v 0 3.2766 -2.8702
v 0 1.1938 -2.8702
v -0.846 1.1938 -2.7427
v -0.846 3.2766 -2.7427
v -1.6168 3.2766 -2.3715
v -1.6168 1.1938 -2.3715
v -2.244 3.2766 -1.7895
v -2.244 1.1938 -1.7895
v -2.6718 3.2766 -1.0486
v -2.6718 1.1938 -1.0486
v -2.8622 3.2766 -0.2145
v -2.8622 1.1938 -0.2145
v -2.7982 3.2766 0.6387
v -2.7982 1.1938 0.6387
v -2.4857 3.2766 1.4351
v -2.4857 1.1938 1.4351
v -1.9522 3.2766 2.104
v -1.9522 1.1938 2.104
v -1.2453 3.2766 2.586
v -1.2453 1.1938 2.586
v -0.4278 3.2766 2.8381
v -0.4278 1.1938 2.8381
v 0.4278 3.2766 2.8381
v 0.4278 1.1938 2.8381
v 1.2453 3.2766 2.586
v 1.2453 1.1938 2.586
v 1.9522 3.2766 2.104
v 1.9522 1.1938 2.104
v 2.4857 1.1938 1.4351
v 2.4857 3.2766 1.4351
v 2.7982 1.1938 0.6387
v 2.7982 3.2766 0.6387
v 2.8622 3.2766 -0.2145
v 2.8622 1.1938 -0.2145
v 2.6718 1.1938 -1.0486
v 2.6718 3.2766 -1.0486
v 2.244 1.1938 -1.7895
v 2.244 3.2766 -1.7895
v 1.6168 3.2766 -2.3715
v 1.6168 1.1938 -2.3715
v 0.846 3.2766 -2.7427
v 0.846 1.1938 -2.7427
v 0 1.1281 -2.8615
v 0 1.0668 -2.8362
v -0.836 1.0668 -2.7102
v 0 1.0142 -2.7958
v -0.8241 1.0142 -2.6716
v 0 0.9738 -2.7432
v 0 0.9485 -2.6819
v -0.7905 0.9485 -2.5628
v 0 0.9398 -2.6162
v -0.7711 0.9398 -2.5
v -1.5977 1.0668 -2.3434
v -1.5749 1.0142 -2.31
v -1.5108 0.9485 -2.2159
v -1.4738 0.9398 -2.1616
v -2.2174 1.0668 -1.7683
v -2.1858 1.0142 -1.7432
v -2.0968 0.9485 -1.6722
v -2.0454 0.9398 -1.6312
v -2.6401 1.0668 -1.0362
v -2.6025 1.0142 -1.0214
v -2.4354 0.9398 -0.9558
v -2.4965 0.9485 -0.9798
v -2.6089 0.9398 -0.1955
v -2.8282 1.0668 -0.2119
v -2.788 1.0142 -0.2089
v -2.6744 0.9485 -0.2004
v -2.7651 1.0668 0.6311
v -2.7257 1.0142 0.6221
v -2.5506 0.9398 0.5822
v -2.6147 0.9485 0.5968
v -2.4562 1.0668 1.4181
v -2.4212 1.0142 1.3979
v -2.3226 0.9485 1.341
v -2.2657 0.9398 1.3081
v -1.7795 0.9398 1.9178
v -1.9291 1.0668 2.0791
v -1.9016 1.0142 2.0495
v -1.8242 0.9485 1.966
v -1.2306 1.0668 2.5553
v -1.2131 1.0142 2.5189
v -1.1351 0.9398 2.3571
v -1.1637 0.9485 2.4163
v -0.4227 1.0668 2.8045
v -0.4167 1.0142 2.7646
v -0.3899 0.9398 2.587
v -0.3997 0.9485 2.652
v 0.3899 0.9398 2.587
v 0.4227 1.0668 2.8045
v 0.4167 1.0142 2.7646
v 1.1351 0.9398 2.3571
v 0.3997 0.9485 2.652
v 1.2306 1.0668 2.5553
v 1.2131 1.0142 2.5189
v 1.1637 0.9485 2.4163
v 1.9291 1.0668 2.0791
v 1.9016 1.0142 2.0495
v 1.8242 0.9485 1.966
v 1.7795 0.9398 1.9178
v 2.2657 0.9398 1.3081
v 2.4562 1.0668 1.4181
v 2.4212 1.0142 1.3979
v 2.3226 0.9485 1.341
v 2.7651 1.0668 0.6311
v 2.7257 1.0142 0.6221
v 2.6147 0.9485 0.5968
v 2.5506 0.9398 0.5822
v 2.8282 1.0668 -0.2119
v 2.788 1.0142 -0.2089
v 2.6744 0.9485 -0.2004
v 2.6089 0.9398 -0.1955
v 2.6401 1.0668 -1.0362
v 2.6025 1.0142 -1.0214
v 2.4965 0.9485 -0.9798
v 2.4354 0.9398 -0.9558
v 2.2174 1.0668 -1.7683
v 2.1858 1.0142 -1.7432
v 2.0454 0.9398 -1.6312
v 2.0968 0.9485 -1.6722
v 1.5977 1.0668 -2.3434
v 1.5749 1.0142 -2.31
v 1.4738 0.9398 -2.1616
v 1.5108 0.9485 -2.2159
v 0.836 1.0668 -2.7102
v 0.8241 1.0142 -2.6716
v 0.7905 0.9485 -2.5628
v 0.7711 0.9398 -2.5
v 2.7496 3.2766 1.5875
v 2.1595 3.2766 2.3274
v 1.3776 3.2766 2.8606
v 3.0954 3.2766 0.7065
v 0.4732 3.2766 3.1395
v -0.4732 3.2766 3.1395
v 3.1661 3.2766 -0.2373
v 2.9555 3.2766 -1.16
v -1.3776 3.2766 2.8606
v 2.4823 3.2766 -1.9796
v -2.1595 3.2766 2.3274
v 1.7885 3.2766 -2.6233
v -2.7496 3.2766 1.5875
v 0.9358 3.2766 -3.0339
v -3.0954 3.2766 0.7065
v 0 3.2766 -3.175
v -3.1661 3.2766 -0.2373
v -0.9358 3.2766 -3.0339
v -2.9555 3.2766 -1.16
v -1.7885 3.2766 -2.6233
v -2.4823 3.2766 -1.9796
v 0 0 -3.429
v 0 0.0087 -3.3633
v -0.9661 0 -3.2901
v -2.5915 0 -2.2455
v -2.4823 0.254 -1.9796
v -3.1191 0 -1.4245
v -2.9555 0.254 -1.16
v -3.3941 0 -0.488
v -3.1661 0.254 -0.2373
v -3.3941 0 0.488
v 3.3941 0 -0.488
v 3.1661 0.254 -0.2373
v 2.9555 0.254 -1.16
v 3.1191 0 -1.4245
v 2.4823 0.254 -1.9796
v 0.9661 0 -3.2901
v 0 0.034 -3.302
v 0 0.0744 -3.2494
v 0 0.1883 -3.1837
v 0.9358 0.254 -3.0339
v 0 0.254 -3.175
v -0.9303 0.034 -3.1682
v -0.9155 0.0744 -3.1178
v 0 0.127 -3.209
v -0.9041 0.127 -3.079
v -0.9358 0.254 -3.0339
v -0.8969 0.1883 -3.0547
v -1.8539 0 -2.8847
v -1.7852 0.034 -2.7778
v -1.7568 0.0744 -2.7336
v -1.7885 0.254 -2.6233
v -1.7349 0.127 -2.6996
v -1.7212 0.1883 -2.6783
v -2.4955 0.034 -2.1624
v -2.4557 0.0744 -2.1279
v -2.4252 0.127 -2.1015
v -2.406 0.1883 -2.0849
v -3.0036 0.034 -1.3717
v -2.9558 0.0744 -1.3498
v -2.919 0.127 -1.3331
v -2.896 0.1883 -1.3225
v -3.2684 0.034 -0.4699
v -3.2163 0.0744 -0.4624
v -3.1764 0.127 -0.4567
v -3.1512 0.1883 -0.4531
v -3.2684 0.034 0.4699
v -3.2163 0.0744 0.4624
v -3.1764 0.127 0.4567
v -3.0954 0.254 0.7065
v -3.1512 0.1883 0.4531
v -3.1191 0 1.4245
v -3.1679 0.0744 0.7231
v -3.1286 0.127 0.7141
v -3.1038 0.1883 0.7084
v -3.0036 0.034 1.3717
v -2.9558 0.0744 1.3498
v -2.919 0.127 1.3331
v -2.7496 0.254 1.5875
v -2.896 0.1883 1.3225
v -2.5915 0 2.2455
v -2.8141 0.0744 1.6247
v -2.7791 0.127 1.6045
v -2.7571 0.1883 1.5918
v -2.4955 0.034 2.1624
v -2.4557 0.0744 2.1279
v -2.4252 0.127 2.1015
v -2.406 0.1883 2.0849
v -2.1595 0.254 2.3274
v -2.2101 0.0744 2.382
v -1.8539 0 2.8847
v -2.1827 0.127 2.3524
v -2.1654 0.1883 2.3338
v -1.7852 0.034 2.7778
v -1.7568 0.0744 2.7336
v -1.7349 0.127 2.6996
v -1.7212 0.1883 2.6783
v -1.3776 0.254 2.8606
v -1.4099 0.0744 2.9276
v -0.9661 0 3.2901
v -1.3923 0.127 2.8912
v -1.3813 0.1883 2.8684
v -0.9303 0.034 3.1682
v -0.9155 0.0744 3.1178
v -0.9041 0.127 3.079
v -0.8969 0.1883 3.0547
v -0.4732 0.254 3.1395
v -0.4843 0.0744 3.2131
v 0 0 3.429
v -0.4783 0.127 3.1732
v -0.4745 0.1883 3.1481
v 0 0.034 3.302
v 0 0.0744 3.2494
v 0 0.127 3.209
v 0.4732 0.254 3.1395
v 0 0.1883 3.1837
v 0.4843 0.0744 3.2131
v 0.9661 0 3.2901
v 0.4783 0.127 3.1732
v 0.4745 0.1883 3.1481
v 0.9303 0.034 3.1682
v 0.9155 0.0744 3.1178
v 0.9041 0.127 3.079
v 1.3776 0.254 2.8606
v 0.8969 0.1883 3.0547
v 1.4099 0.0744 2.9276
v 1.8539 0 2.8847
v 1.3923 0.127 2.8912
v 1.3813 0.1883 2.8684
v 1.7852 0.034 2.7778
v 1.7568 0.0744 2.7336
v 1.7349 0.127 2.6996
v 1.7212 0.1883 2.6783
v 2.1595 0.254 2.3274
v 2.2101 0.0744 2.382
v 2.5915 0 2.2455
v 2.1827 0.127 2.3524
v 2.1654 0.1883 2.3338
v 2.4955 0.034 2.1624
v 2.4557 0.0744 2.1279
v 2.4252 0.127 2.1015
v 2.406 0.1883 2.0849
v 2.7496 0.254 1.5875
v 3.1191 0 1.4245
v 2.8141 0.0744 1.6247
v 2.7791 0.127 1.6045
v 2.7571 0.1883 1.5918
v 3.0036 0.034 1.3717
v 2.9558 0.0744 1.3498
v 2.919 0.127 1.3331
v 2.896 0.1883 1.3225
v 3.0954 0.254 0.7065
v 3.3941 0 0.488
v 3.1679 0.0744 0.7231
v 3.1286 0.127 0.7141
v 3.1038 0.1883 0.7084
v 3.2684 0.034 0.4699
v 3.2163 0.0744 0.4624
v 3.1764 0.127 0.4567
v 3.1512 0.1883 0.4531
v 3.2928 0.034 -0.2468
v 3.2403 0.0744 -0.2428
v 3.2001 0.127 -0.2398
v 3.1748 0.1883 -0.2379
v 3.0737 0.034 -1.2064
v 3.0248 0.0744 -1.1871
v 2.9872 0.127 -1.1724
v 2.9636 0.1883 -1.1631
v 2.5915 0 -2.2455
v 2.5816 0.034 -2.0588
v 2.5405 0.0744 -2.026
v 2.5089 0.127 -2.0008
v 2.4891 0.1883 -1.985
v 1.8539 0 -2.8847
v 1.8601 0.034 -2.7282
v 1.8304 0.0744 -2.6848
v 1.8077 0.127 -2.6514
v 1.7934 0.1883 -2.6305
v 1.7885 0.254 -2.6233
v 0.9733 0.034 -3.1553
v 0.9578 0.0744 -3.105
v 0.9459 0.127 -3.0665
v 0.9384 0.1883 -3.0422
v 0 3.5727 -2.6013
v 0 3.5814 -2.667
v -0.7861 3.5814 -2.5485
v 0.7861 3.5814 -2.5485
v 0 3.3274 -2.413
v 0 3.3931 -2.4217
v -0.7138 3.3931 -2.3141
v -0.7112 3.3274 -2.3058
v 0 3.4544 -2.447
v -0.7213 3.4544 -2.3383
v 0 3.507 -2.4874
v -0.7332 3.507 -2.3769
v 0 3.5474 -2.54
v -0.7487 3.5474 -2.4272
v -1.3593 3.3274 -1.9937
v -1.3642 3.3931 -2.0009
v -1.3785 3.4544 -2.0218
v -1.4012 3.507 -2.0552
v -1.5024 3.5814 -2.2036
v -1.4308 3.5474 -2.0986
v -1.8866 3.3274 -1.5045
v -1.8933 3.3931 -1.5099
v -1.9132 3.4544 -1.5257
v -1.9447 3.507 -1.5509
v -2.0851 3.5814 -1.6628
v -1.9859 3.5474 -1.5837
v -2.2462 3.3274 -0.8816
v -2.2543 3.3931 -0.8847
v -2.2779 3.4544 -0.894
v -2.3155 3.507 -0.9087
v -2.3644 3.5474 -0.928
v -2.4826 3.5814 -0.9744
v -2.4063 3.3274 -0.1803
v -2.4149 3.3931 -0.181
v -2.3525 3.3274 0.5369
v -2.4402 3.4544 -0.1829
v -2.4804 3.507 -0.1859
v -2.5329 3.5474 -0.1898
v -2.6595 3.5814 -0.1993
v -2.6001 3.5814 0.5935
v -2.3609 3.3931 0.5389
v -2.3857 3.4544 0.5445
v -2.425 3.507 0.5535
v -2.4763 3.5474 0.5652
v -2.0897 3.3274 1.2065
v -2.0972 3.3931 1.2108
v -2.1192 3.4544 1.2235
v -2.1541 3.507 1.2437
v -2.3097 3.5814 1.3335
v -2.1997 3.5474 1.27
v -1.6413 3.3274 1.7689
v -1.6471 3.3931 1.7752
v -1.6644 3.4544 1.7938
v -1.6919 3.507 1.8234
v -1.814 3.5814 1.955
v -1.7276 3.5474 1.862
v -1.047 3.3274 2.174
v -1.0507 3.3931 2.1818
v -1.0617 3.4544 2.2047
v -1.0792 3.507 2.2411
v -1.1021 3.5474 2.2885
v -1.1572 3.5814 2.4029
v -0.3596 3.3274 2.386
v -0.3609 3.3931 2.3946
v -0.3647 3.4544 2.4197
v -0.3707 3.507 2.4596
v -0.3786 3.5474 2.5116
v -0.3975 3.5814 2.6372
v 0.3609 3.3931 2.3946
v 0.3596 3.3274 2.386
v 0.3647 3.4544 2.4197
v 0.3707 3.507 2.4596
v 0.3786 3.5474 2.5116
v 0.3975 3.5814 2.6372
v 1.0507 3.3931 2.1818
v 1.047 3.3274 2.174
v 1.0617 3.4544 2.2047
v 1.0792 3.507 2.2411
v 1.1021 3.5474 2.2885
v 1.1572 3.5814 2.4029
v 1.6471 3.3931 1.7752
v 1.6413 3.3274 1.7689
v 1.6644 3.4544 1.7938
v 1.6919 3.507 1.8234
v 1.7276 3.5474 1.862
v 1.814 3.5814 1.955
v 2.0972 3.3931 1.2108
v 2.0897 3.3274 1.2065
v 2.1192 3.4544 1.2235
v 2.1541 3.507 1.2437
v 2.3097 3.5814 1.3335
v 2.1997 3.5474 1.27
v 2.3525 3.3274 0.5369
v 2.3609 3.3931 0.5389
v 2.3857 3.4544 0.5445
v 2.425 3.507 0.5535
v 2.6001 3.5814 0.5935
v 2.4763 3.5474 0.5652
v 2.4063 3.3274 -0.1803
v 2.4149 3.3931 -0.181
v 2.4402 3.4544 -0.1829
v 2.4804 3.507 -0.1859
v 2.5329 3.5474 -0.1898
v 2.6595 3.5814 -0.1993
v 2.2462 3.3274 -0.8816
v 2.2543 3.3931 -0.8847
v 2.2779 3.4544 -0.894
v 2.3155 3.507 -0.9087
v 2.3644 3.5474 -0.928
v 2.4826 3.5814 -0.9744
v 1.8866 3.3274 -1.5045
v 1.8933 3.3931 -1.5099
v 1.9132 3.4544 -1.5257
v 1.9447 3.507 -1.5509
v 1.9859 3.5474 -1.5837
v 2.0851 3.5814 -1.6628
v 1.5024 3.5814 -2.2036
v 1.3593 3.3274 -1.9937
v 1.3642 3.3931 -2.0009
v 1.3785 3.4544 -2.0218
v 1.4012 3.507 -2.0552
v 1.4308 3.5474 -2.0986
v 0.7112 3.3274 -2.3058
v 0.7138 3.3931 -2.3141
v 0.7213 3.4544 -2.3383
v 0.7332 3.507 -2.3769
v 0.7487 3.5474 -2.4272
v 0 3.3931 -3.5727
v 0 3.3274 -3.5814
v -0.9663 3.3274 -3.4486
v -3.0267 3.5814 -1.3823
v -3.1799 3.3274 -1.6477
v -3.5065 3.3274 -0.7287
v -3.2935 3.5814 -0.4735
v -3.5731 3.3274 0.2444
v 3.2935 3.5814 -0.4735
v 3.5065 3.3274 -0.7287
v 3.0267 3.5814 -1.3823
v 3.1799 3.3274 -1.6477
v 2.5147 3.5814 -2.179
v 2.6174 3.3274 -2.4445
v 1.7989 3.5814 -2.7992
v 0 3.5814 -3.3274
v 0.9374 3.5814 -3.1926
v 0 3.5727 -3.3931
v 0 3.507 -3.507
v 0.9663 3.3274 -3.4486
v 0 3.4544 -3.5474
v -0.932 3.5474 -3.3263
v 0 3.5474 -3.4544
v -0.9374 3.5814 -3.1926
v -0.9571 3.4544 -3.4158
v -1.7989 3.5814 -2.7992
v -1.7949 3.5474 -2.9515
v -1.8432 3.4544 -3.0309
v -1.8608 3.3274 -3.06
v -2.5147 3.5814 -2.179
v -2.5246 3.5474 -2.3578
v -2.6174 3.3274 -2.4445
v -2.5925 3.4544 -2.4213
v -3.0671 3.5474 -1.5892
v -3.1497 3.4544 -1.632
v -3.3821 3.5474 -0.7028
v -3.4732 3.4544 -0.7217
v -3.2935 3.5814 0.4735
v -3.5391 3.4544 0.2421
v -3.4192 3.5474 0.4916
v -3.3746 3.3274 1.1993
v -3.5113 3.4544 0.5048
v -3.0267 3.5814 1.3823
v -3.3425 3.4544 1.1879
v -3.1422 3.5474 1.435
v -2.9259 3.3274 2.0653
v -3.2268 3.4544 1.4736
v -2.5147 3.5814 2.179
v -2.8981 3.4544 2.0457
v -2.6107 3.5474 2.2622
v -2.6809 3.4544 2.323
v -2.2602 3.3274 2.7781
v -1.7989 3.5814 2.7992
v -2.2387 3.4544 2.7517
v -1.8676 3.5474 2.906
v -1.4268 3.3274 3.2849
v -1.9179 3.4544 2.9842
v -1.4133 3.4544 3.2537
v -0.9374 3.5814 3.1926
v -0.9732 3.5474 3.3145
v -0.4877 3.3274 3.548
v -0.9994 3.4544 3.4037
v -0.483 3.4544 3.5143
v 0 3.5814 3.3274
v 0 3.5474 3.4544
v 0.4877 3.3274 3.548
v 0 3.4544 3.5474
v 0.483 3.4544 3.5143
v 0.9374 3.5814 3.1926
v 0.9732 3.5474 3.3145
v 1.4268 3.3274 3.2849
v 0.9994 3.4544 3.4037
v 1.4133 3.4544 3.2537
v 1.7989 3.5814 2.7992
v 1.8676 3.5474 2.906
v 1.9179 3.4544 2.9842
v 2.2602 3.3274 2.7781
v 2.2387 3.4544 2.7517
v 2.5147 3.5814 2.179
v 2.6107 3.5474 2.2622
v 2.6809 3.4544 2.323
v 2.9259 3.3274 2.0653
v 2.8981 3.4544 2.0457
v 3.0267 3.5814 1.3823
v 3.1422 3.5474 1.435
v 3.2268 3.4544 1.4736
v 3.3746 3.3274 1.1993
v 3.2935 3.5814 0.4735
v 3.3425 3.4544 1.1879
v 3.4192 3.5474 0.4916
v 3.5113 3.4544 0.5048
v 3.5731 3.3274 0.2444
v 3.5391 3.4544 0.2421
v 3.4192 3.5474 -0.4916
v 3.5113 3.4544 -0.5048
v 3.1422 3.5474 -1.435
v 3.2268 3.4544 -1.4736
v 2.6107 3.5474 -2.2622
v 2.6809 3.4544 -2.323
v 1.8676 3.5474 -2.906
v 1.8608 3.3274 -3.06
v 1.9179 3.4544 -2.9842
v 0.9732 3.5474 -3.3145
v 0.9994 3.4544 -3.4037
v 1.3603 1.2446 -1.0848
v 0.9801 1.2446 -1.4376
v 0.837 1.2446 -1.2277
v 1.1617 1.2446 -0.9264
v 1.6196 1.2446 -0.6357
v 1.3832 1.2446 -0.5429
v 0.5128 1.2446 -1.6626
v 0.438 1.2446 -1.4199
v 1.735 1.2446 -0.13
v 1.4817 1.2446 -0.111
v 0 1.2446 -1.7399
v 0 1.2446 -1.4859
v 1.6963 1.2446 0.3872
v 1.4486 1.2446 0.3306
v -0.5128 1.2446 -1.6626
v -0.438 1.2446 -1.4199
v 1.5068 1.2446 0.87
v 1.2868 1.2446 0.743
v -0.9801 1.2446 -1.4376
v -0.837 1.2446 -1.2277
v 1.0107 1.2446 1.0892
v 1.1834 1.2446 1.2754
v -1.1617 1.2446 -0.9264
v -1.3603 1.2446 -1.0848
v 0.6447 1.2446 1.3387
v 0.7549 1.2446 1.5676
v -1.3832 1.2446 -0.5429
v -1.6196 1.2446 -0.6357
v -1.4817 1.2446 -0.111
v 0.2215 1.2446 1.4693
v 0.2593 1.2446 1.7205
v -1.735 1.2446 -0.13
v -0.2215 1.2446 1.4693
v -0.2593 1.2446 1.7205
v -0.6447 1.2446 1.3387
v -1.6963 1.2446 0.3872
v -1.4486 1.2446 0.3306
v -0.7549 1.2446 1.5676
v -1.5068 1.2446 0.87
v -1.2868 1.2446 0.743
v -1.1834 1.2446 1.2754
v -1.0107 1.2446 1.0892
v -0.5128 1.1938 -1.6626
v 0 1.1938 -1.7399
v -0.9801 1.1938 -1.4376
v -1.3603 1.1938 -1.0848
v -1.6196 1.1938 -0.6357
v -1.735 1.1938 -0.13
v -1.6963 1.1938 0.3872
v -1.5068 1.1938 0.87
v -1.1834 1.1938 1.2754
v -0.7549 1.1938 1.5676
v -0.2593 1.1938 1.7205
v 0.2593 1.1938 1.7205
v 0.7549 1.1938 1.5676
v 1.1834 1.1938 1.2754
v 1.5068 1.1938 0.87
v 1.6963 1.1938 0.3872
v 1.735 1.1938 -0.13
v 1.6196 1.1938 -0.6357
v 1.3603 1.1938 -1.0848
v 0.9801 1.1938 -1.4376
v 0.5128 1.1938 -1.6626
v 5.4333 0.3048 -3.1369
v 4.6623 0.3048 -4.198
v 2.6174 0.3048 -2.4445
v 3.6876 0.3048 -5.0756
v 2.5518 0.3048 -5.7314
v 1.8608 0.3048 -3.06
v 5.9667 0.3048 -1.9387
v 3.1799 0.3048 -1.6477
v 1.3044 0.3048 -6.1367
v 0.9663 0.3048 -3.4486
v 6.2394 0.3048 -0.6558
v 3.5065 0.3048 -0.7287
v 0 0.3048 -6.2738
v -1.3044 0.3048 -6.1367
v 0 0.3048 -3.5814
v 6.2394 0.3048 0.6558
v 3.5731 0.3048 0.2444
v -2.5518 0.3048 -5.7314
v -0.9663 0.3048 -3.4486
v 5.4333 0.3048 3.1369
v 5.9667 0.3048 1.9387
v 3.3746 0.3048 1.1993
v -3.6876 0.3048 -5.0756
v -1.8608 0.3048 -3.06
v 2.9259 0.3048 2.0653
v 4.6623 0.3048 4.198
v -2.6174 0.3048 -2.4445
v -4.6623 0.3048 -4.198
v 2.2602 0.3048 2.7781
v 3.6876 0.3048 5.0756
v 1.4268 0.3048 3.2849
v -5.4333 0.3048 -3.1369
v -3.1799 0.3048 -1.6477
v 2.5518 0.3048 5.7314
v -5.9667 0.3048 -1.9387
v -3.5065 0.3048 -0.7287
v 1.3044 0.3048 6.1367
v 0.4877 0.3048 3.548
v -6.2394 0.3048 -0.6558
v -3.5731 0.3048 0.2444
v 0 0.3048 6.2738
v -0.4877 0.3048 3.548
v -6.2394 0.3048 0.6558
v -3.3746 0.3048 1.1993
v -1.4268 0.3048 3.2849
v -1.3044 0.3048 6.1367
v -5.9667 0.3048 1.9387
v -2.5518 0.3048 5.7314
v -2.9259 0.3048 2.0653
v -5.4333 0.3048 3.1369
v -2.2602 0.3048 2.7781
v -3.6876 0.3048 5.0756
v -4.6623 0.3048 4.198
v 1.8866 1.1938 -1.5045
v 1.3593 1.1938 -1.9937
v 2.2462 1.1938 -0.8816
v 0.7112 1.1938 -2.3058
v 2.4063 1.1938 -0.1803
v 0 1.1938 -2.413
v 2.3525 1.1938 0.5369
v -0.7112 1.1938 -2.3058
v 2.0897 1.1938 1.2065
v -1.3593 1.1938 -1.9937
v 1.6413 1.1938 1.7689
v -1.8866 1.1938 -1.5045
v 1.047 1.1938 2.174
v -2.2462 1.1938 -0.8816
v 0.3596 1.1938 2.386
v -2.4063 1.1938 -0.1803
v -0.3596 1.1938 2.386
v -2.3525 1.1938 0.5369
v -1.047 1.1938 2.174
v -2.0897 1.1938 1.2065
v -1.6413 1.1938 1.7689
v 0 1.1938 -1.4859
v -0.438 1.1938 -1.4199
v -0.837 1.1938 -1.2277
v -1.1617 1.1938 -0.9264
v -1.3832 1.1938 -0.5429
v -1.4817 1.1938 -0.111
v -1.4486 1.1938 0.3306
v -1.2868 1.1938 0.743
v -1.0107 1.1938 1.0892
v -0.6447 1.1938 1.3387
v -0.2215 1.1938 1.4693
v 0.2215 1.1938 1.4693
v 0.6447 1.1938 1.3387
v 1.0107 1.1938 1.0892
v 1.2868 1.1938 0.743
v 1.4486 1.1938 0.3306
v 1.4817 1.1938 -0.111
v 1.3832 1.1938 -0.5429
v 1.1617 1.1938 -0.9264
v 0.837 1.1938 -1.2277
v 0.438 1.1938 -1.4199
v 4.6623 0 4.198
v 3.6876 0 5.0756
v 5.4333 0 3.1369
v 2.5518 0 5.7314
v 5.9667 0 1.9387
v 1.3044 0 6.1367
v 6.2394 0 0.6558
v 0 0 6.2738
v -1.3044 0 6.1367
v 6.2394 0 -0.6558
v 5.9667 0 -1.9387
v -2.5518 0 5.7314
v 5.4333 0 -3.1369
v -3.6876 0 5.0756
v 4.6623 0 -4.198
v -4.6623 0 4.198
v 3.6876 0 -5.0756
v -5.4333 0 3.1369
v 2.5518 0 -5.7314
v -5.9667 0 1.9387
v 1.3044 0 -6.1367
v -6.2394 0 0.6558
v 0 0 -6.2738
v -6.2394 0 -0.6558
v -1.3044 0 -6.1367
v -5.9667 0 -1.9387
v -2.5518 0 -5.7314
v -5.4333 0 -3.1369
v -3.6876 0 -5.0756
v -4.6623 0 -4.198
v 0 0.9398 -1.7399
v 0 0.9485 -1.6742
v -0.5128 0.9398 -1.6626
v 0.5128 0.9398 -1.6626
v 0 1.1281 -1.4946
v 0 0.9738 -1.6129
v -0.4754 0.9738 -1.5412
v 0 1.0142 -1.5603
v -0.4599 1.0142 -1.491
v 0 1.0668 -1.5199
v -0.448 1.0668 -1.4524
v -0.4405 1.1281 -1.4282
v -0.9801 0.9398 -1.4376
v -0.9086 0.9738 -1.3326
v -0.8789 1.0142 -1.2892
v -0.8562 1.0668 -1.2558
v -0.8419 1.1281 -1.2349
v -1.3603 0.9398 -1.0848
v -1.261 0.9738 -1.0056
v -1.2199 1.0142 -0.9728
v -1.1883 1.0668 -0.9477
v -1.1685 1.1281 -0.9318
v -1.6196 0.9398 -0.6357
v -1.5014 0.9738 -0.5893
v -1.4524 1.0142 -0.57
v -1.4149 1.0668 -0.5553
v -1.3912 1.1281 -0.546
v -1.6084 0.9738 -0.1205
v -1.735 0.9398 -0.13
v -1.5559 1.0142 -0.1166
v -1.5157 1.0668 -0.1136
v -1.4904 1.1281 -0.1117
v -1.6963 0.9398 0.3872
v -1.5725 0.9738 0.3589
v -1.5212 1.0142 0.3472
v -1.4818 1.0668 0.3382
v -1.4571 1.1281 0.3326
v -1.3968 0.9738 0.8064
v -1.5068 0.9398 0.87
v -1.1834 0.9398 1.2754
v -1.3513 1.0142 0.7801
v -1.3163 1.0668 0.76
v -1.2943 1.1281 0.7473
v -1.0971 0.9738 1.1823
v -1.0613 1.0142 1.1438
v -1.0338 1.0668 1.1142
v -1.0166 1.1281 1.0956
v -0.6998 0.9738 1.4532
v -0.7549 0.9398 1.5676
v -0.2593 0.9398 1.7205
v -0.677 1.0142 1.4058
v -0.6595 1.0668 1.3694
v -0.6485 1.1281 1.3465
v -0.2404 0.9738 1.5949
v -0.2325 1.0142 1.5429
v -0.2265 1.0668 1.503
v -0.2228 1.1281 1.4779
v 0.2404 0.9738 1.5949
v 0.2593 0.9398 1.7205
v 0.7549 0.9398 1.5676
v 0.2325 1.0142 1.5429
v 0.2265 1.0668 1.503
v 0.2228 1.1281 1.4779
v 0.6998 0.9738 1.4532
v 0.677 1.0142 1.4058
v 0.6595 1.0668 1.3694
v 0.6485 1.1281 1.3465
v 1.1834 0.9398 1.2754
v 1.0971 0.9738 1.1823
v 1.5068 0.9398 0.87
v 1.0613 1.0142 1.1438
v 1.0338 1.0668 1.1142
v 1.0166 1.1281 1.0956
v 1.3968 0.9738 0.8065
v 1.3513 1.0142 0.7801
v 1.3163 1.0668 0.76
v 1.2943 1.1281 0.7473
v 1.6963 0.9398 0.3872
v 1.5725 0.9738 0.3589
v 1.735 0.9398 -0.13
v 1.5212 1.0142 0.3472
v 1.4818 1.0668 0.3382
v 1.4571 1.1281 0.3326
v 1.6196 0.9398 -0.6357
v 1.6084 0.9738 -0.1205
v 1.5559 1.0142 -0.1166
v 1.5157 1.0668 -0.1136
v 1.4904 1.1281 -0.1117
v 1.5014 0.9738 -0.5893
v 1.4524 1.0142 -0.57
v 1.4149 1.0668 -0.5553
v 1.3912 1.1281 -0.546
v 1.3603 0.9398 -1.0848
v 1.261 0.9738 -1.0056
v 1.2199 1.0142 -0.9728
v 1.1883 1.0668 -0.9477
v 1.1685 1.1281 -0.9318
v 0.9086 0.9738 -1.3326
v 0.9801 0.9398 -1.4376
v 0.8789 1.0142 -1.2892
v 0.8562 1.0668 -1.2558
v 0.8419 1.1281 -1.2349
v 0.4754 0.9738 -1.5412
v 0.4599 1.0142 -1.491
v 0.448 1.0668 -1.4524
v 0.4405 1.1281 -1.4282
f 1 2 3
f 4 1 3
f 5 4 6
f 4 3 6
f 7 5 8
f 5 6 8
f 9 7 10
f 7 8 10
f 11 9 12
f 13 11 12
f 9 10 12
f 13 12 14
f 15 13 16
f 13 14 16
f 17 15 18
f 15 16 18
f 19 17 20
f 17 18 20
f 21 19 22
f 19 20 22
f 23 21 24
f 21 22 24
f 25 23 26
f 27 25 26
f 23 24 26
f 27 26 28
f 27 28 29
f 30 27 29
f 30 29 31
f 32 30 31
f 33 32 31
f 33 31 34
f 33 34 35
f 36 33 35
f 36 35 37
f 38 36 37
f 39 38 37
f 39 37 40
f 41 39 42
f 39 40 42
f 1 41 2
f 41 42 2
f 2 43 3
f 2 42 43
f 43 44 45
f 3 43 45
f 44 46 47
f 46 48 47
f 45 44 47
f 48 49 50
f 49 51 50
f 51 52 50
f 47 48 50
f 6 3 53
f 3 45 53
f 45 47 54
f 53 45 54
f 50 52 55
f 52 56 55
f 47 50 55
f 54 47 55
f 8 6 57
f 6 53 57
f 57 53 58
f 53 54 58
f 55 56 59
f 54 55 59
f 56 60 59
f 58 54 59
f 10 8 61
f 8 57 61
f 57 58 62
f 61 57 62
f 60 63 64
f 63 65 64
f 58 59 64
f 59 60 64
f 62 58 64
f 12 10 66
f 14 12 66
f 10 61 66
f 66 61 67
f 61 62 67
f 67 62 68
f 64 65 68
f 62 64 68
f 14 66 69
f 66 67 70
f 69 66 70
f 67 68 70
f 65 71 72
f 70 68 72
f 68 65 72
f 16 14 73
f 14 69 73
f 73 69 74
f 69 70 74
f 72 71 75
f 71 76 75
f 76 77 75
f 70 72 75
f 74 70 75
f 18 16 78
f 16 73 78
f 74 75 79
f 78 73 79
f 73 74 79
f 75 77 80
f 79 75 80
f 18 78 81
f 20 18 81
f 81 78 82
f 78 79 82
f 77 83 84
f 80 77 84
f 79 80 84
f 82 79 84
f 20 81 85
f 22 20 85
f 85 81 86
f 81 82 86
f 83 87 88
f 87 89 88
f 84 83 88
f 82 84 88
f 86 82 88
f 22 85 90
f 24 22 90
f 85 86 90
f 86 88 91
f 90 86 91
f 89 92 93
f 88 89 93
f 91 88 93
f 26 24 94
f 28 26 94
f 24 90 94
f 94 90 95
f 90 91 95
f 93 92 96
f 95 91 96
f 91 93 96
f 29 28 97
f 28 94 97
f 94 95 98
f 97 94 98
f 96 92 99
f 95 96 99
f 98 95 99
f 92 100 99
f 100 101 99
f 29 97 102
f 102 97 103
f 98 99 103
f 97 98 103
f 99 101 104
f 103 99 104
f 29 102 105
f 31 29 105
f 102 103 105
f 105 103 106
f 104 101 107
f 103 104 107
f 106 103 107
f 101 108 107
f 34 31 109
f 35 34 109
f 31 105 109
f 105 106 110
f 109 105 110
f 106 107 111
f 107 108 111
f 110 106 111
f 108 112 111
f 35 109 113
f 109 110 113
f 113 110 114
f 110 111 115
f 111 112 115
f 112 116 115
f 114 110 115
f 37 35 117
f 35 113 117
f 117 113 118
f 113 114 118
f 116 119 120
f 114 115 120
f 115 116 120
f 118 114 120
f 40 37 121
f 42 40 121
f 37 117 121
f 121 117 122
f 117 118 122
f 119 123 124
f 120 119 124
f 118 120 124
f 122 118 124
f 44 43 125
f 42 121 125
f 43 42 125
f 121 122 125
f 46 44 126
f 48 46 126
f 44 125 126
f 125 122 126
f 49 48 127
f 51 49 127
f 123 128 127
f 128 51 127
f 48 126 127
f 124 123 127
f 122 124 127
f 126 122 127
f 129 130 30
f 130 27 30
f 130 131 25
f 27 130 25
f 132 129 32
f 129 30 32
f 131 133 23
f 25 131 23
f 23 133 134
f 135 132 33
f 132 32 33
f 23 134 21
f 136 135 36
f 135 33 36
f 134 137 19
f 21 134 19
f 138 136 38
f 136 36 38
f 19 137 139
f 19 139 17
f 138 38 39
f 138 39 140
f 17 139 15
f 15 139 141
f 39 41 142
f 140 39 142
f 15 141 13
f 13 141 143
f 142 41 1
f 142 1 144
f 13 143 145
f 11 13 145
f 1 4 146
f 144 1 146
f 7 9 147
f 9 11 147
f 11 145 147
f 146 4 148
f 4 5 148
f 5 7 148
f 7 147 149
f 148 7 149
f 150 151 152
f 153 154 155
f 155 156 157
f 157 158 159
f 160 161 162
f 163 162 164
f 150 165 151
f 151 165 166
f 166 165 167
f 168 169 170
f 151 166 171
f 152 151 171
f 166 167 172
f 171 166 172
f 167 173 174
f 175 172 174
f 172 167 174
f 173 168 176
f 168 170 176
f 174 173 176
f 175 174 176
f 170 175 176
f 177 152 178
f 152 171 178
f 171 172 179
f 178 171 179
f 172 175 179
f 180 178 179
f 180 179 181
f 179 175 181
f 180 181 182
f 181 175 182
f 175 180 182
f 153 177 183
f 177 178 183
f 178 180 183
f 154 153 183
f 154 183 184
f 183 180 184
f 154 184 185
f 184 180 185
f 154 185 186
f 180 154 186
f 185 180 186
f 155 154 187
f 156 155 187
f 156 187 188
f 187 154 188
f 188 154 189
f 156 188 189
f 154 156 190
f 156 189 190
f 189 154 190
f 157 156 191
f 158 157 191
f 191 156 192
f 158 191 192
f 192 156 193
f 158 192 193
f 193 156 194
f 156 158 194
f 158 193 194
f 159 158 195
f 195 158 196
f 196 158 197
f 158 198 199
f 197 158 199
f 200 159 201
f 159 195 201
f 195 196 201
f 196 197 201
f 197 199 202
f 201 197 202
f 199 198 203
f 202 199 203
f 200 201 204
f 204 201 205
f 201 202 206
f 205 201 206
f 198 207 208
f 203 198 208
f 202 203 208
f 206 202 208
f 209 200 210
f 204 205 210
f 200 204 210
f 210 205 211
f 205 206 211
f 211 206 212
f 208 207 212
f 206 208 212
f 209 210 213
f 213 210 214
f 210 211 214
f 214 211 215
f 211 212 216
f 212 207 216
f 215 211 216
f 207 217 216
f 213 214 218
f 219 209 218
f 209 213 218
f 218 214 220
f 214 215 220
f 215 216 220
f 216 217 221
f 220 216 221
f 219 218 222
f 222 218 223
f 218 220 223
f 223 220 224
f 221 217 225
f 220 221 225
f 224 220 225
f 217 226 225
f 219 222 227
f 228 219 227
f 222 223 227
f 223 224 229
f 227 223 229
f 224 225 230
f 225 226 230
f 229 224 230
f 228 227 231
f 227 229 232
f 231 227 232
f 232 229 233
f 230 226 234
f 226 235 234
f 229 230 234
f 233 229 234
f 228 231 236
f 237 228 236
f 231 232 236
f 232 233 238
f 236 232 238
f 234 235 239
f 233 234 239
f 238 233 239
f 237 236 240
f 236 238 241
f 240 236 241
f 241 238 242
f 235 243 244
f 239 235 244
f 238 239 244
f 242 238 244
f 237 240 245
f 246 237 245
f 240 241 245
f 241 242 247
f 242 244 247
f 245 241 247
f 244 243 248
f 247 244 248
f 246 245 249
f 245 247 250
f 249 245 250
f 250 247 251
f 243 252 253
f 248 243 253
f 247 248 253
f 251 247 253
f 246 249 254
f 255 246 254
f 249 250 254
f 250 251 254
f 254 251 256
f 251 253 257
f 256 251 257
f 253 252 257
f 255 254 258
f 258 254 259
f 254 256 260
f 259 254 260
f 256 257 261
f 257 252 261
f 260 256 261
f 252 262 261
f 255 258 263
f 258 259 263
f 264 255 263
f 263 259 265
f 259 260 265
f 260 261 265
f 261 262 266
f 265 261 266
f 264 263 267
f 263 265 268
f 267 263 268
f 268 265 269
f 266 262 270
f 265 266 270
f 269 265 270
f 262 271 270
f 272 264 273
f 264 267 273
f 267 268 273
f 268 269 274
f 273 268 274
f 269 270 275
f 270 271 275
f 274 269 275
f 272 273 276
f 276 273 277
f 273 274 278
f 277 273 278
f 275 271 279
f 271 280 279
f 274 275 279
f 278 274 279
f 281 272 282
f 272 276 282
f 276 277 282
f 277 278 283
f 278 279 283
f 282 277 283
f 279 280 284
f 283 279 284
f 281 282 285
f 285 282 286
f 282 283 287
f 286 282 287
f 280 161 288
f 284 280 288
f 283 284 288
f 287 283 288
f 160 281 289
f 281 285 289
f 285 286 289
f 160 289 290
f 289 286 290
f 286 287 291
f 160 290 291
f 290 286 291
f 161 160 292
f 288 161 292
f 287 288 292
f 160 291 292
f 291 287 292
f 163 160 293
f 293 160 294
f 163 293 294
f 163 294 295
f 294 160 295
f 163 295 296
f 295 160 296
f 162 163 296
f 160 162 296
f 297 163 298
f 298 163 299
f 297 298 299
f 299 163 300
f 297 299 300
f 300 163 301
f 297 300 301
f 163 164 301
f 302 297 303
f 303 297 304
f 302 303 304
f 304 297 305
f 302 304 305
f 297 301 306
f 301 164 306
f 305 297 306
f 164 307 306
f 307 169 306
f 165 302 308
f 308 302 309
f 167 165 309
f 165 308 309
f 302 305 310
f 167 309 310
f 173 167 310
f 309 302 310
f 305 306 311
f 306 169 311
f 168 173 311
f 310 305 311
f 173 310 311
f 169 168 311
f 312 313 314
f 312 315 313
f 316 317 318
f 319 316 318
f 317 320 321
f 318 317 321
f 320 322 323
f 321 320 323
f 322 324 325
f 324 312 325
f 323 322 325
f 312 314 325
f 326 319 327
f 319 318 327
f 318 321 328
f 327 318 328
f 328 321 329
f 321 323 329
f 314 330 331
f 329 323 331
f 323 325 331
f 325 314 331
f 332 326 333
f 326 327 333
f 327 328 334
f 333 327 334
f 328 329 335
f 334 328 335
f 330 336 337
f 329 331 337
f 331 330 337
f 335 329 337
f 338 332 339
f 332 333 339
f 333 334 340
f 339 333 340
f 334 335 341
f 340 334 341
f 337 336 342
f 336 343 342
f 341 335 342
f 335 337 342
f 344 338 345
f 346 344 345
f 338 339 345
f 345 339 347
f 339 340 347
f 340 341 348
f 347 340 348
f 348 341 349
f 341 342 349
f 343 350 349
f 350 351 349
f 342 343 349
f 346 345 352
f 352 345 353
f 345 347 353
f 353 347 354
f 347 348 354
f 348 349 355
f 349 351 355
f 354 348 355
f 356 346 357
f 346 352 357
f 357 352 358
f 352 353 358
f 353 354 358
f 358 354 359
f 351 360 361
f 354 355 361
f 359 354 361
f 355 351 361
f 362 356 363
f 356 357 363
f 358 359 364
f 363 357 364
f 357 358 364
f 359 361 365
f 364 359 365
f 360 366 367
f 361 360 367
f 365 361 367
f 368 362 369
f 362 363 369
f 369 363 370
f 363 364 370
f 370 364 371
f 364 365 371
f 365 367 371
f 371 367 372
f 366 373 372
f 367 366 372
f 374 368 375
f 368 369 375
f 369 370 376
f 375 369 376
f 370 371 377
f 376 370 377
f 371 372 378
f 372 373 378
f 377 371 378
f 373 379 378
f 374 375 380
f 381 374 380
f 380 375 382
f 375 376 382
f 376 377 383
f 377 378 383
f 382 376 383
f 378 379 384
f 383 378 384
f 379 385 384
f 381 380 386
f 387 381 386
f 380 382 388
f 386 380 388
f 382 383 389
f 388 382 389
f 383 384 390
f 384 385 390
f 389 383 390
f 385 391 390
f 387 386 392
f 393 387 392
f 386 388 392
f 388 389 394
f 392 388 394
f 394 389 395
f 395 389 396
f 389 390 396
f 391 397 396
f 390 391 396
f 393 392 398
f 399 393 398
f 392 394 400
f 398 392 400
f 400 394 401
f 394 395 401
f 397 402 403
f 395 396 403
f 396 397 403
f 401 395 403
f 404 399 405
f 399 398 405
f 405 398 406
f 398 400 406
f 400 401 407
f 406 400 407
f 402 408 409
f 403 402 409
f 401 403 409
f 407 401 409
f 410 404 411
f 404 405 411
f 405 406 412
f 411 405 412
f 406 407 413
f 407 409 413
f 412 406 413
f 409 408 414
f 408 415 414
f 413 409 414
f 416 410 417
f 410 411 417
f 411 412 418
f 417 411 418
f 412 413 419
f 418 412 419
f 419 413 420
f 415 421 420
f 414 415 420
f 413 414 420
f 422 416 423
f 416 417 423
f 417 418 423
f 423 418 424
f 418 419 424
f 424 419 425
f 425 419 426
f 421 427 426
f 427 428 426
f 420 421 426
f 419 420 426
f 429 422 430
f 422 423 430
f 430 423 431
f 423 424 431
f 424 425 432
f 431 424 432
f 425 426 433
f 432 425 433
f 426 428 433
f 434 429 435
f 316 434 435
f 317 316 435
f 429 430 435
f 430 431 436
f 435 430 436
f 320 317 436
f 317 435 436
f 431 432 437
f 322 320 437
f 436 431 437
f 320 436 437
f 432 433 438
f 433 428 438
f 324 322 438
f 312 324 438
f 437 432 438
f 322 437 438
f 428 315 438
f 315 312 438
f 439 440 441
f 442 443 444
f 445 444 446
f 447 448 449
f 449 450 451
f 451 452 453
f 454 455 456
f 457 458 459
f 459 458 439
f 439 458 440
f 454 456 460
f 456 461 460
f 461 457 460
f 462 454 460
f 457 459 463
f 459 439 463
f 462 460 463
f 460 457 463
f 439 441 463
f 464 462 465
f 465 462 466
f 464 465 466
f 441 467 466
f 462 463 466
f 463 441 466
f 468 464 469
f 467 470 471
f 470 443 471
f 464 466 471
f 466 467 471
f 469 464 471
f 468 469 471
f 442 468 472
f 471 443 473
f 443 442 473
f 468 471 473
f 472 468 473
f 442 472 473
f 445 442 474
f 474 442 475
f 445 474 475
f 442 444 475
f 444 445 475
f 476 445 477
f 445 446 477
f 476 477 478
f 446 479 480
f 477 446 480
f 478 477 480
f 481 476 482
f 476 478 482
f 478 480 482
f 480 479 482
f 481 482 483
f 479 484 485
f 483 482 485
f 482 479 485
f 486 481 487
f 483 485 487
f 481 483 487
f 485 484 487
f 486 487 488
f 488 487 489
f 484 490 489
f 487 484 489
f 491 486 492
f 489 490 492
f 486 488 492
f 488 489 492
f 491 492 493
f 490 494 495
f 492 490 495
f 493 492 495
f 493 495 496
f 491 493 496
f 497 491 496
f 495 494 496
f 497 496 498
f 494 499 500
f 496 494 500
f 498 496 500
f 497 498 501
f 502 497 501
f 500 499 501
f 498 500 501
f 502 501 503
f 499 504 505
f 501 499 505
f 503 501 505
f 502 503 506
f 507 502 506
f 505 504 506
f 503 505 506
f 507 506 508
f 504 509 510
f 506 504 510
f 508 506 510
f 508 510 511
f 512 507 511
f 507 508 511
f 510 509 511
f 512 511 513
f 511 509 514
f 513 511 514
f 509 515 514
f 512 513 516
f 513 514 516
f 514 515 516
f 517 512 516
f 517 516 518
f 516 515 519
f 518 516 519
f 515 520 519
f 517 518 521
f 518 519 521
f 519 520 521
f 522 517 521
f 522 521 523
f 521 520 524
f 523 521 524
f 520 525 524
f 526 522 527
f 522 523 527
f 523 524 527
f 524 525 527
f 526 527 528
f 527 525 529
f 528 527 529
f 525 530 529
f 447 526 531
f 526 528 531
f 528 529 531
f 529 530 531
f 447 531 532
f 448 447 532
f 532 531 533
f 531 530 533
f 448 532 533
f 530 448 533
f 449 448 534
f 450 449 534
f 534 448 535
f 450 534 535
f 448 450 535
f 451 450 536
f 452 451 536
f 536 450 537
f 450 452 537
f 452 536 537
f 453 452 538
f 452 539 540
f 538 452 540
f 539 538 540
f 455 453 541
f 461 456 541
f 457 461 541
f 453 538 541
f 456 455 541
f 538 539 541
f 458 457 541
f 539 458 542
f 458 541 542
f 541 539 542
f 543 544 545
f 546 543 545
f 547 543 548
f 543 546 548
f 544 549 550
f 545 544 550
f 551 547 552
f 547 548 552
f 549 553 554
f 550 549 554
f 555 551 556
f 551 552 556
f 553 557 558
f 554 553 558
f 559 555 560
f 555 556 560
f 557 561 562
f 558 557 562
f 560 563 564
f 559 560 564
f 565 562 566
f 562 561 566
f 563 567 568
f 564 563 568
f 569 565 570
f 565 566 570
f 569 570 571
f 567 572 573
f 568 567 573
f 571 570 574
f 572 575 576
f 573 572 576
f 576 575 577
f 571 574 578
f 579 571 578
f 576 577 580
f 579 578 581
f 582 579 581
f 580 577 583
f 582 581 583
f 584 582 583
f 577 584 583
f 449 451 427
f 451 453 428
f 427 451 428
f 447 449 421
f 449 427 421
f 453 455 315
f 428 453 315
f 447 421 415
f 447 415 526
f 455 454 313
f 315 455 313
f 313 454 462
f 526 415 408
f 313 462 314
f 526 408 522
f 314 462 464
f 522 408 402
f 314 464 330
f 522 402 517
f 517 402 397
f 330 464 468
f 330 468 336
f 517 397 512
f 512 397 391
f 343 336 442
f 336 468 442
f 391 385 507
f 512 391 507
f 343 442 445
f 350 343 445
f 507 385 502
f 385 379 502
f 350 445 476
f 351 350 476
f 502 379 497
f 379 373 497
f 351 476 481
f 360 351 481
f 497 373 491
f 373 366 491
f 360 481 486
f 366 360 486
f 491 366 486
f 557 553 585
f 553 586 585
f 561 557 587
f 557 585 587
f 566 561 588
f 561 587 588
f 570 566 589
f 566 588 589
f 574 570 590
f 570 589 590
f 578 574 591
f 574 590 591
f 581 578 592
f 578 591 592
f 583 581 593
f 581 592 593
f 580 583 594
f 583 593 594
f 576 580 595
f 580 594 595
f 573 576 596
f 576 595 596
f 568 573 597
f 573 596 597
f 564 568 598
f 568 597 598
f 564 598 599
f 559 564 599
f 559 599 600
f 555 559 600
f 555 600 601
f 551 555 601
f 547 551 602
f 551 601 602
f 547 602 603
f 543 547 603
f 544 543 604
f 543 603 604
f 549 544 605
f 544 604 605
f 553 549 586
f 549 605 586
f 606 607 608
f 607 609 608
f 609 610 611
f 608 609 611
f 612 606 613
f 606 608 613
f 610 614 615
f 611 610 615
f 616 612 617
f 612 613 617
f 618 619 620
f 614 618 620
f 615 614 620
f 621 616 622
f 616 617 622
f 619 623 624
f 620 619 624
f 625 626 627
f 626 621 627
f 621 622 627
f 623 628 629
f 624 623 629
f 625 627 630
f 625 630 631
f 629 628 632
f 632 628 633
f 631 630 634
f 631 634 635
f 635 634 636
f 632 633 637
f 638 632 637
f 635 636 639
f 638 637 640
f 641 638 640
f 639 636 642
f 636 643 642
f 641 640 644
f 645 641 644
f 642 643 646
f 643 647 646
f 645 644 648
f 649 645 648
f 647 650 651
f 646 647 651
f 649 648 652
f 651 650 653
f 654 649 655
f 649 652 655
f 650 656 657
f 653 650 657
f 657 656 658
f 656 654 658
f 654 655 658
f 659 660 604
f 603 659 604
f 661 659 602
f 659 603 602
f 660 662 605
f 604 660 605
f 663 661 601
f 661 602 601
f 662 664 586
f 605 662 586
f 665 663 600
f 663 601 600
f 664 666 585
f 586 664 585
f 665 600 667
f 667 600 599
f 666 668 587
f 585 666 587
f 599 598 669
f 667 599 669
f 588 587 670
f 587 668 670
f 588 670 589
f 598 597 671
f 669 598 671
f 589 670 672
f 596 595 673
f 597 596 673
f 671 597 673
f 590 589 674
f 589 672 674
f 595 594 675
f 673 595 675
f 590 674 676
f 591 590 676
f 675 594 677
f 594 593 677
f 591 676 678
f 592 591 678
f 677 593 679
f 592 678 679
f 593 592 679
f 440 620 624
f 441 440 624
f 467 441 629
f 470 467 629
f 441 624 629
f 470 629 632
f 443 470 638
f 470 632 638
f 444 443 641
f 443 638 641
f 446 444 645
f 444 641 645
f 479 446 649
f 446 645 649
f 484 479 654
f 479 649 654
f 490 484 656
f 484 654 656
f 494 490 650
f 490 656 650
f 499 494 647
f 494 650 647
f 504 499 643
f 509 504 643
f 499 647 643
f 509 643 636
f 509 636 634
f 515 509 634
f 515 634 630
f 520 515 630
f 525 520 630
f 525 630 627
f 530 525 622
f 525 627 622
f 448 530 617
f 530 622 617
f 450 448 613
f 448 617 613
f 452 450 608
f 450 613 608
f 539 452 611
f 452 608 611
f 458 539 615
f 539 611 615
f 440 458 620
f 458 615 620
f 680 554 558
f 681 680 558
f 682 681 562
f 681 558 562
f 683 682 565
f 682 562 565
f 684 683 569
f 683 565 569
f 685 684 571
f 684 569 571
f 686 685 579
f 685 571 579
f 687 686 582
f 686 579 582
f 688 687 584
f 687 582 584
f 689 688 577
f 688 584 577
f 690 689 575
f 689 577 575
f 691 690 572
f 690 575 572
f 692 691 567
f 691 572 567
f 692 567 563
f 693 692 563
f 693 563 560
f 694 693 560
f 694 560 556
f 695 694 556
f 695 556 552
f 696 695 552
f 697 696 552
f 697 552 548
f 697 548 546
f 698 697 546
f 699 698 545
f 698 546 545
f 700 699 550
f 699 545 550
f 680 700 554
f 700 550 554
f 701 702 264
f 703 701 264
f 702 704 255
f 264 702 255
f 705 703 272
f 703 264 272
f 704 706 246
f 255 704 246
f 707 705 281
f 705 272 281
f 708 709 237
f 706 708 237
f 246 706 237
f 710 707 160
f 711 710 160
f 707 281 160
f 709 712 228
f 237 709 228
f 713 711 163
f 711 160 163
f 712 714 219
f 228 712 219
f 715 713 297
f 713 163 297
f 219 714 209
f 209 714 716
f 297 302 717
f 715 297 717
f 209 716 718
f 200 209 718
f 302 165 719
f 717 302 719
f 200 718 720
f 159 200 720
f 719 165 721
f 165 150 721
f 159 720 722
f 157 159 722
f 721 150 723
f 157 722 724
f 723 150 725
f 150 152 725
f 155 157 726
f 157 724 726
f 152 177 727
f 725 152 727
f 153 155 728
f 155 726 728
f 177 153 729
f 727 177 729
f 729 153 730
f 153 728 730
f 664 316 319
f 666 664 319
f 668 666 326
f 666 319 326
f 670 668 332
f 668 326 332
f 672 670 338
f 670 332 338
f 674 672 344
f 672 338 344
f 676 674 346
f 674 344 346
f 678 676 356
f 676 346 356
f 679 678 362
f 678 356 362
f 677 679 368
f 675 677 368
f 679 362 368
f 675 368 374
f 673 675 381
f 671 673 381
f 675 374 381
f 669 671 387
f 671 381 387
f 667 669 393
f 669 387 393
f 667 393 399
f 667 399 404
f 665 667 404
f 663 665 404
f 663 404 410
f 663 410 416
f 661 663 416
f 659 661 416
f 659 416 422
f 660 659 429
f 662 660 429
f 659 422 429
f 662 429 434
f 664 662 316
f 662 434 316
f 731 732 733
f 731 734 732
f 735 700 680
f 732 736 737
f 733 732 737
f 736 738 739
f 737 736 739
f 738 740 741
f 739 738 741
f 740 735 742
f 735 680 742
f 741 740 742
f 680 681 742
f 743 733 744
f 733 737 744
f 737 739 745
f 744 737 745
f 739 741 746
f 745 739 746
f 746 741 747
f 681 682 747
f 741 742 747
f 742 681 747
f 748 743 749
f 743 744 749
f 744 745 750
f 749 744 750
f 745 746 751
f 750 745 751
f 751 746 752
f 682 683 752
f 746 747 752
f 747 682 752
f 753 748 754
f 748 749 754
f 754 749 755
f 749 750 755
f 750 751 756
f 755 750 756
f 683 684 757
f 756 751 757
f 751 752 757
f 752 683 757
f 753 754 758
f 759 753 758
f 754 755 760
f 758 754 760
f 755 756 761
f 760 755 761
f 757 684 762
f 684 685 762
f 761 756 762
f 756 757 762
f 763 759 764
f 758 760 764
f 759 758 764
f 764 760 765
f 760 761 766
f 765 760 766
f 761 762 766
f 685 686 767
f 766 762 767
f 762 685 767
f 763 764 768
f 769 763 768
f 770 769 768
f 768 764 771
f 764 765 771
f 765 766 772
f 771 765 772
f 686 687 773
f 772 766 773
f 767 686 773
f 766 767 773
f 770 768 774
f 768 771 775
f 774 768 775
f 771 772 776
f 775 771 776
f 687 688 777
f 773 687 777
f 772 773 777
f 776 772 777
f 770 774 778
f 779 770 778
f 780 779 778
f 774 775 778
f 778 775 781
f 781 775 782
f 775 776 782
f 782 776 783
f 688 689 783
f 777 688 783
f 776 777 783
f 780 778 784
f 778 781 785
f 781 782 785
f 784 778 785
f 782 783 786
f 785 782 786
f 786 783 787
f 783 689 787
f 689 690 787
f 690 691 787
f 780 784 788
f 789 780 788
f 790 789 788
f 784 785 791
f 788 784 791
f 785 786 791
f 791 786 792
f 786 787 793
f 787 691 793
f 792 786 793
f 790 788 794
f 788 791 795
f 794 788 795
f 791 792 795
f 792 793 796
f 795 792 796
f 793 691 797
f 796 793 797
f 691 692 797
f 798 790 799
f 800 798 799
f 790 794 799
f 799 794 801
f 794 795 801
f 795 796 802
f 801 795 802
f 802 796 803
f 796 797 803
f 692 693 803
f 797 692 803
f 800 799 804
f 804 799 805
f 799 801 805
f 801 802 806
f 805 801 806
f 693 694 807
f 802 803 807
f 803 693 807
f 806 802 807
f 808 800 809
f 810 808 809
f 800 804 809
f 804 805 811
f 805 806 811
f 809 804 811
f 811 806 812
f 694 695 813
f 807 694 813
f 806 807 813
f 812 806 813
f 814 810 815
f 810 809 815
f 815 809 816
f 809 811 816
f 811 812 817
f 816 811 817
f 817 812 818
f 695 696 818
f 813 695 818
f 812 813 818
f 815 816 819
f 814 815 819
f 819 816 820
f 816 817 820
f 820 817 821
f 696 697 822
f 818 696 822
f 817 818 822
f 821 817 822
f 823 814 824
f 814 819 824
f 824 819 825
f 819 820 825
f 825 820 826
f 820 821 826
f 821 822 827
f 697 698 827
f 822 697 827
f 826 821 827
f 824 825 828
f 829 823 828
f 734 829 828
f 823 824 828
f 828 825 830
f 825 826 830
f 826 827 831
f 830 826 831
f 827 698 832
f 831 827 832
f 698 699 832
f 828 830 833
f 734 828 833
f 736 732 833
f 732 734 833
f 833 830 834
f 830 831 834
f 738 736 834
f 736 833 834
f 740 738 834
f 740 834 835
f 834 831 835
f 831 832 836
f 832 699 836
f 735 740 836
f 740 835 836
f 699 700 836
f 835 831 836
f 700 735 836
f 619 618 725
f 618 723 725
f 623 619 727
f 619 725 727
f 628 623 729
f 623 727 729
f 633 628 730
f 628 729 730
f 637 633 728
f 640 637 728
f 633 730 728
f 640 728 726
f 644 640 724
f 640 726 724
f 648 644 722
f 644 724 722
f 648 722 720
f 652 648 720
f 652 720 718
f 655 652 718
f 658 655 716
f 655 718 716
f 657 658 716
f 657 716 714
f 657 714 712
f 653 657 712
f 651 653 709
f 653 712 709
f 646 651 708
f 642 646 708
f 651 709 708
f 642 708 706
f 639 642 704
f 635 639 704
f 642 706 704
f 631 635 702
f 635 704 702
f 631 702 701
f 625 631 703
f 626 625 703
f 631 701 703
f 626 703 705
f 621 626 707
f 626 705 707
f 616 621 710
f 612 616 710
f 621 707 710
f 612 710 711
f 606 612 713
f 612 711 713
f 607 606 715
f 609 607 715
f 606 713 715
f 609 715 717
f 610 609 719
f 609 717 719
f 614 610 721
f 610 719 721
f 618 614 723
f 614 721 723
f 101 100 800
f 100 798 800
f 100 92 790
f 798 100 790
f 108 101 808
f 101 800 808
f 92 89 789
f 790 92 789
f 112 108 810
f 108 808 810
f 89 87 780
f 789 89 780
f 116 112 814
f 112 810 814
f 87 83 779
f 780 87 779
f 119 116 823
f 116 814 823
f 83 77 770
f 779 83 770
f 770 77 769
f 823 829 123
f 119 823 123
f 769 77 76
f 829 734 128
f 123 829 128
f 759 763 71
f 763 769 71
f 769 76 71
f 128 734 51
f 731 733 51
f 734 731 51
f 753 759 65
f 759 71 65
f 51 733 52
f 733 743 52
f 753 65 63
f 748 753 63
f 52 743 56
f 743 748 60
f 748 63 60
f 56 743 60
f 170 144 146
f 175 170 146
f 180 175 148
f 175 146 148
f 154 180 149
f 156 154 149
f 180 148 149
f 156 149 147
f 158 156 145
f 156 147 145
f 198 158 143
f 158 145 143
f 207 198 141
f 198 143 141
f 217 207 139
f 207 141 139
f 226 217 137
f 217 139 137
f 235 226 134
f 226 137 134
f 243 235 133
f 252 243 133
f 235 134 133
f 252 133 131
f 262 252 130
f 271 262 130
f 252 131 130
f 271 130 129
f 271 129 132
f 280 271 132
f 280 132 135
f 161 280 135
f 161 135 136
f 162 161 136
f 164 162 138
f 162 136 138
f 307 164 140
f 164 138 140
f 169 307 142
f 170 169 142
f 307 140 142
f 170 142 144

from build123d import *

# Parameters (mm, degrees)
FILLET1_R = 0.254


with BuildPart() as part:
    # Sketch1 → Revolve1 (revolve)
    with BuildSketch(Plane.XY, mode=Mode.PRIVATE) as revolve1_sk:
        Polygon((-6.2738, 0), (-3.175, 0), (-3.175, 3.2766), (-2.8702, 3.2766), (-2.8702, 0.9398), (-1.4859, 0.9398), (-1.4859, 1.2446), (-1.7399, 1.2446), (-1.7399, 1.1938), (-2.413, 1.1938), (-2.413, 3.5814), (-3.5814, 3.5814), (-3.5814, 0.3048), (-6.2738, 0.3048), align=None)
    revolve(revolve1_sk.sketch.rotate(Axis((0, 0, 0), (0, 1, 0)), 270), axis=Axis((0, 0, 0), (0, 1, 0)))

    # Fillet1
    fillet1_edges = [part.edges().sort_by_distance(p)[0] for p in [
        (0, 0.9398, 2.8702),
        (0, 0.9398, 1.4859),
        (0, 3.5814, 2.413),
        (0, 3.5814, 3.5814),
        (0, 0, 3.175),
    ]]
    fillet(fillet1_edges, radius=FILLET1_R)


solid = part.part
